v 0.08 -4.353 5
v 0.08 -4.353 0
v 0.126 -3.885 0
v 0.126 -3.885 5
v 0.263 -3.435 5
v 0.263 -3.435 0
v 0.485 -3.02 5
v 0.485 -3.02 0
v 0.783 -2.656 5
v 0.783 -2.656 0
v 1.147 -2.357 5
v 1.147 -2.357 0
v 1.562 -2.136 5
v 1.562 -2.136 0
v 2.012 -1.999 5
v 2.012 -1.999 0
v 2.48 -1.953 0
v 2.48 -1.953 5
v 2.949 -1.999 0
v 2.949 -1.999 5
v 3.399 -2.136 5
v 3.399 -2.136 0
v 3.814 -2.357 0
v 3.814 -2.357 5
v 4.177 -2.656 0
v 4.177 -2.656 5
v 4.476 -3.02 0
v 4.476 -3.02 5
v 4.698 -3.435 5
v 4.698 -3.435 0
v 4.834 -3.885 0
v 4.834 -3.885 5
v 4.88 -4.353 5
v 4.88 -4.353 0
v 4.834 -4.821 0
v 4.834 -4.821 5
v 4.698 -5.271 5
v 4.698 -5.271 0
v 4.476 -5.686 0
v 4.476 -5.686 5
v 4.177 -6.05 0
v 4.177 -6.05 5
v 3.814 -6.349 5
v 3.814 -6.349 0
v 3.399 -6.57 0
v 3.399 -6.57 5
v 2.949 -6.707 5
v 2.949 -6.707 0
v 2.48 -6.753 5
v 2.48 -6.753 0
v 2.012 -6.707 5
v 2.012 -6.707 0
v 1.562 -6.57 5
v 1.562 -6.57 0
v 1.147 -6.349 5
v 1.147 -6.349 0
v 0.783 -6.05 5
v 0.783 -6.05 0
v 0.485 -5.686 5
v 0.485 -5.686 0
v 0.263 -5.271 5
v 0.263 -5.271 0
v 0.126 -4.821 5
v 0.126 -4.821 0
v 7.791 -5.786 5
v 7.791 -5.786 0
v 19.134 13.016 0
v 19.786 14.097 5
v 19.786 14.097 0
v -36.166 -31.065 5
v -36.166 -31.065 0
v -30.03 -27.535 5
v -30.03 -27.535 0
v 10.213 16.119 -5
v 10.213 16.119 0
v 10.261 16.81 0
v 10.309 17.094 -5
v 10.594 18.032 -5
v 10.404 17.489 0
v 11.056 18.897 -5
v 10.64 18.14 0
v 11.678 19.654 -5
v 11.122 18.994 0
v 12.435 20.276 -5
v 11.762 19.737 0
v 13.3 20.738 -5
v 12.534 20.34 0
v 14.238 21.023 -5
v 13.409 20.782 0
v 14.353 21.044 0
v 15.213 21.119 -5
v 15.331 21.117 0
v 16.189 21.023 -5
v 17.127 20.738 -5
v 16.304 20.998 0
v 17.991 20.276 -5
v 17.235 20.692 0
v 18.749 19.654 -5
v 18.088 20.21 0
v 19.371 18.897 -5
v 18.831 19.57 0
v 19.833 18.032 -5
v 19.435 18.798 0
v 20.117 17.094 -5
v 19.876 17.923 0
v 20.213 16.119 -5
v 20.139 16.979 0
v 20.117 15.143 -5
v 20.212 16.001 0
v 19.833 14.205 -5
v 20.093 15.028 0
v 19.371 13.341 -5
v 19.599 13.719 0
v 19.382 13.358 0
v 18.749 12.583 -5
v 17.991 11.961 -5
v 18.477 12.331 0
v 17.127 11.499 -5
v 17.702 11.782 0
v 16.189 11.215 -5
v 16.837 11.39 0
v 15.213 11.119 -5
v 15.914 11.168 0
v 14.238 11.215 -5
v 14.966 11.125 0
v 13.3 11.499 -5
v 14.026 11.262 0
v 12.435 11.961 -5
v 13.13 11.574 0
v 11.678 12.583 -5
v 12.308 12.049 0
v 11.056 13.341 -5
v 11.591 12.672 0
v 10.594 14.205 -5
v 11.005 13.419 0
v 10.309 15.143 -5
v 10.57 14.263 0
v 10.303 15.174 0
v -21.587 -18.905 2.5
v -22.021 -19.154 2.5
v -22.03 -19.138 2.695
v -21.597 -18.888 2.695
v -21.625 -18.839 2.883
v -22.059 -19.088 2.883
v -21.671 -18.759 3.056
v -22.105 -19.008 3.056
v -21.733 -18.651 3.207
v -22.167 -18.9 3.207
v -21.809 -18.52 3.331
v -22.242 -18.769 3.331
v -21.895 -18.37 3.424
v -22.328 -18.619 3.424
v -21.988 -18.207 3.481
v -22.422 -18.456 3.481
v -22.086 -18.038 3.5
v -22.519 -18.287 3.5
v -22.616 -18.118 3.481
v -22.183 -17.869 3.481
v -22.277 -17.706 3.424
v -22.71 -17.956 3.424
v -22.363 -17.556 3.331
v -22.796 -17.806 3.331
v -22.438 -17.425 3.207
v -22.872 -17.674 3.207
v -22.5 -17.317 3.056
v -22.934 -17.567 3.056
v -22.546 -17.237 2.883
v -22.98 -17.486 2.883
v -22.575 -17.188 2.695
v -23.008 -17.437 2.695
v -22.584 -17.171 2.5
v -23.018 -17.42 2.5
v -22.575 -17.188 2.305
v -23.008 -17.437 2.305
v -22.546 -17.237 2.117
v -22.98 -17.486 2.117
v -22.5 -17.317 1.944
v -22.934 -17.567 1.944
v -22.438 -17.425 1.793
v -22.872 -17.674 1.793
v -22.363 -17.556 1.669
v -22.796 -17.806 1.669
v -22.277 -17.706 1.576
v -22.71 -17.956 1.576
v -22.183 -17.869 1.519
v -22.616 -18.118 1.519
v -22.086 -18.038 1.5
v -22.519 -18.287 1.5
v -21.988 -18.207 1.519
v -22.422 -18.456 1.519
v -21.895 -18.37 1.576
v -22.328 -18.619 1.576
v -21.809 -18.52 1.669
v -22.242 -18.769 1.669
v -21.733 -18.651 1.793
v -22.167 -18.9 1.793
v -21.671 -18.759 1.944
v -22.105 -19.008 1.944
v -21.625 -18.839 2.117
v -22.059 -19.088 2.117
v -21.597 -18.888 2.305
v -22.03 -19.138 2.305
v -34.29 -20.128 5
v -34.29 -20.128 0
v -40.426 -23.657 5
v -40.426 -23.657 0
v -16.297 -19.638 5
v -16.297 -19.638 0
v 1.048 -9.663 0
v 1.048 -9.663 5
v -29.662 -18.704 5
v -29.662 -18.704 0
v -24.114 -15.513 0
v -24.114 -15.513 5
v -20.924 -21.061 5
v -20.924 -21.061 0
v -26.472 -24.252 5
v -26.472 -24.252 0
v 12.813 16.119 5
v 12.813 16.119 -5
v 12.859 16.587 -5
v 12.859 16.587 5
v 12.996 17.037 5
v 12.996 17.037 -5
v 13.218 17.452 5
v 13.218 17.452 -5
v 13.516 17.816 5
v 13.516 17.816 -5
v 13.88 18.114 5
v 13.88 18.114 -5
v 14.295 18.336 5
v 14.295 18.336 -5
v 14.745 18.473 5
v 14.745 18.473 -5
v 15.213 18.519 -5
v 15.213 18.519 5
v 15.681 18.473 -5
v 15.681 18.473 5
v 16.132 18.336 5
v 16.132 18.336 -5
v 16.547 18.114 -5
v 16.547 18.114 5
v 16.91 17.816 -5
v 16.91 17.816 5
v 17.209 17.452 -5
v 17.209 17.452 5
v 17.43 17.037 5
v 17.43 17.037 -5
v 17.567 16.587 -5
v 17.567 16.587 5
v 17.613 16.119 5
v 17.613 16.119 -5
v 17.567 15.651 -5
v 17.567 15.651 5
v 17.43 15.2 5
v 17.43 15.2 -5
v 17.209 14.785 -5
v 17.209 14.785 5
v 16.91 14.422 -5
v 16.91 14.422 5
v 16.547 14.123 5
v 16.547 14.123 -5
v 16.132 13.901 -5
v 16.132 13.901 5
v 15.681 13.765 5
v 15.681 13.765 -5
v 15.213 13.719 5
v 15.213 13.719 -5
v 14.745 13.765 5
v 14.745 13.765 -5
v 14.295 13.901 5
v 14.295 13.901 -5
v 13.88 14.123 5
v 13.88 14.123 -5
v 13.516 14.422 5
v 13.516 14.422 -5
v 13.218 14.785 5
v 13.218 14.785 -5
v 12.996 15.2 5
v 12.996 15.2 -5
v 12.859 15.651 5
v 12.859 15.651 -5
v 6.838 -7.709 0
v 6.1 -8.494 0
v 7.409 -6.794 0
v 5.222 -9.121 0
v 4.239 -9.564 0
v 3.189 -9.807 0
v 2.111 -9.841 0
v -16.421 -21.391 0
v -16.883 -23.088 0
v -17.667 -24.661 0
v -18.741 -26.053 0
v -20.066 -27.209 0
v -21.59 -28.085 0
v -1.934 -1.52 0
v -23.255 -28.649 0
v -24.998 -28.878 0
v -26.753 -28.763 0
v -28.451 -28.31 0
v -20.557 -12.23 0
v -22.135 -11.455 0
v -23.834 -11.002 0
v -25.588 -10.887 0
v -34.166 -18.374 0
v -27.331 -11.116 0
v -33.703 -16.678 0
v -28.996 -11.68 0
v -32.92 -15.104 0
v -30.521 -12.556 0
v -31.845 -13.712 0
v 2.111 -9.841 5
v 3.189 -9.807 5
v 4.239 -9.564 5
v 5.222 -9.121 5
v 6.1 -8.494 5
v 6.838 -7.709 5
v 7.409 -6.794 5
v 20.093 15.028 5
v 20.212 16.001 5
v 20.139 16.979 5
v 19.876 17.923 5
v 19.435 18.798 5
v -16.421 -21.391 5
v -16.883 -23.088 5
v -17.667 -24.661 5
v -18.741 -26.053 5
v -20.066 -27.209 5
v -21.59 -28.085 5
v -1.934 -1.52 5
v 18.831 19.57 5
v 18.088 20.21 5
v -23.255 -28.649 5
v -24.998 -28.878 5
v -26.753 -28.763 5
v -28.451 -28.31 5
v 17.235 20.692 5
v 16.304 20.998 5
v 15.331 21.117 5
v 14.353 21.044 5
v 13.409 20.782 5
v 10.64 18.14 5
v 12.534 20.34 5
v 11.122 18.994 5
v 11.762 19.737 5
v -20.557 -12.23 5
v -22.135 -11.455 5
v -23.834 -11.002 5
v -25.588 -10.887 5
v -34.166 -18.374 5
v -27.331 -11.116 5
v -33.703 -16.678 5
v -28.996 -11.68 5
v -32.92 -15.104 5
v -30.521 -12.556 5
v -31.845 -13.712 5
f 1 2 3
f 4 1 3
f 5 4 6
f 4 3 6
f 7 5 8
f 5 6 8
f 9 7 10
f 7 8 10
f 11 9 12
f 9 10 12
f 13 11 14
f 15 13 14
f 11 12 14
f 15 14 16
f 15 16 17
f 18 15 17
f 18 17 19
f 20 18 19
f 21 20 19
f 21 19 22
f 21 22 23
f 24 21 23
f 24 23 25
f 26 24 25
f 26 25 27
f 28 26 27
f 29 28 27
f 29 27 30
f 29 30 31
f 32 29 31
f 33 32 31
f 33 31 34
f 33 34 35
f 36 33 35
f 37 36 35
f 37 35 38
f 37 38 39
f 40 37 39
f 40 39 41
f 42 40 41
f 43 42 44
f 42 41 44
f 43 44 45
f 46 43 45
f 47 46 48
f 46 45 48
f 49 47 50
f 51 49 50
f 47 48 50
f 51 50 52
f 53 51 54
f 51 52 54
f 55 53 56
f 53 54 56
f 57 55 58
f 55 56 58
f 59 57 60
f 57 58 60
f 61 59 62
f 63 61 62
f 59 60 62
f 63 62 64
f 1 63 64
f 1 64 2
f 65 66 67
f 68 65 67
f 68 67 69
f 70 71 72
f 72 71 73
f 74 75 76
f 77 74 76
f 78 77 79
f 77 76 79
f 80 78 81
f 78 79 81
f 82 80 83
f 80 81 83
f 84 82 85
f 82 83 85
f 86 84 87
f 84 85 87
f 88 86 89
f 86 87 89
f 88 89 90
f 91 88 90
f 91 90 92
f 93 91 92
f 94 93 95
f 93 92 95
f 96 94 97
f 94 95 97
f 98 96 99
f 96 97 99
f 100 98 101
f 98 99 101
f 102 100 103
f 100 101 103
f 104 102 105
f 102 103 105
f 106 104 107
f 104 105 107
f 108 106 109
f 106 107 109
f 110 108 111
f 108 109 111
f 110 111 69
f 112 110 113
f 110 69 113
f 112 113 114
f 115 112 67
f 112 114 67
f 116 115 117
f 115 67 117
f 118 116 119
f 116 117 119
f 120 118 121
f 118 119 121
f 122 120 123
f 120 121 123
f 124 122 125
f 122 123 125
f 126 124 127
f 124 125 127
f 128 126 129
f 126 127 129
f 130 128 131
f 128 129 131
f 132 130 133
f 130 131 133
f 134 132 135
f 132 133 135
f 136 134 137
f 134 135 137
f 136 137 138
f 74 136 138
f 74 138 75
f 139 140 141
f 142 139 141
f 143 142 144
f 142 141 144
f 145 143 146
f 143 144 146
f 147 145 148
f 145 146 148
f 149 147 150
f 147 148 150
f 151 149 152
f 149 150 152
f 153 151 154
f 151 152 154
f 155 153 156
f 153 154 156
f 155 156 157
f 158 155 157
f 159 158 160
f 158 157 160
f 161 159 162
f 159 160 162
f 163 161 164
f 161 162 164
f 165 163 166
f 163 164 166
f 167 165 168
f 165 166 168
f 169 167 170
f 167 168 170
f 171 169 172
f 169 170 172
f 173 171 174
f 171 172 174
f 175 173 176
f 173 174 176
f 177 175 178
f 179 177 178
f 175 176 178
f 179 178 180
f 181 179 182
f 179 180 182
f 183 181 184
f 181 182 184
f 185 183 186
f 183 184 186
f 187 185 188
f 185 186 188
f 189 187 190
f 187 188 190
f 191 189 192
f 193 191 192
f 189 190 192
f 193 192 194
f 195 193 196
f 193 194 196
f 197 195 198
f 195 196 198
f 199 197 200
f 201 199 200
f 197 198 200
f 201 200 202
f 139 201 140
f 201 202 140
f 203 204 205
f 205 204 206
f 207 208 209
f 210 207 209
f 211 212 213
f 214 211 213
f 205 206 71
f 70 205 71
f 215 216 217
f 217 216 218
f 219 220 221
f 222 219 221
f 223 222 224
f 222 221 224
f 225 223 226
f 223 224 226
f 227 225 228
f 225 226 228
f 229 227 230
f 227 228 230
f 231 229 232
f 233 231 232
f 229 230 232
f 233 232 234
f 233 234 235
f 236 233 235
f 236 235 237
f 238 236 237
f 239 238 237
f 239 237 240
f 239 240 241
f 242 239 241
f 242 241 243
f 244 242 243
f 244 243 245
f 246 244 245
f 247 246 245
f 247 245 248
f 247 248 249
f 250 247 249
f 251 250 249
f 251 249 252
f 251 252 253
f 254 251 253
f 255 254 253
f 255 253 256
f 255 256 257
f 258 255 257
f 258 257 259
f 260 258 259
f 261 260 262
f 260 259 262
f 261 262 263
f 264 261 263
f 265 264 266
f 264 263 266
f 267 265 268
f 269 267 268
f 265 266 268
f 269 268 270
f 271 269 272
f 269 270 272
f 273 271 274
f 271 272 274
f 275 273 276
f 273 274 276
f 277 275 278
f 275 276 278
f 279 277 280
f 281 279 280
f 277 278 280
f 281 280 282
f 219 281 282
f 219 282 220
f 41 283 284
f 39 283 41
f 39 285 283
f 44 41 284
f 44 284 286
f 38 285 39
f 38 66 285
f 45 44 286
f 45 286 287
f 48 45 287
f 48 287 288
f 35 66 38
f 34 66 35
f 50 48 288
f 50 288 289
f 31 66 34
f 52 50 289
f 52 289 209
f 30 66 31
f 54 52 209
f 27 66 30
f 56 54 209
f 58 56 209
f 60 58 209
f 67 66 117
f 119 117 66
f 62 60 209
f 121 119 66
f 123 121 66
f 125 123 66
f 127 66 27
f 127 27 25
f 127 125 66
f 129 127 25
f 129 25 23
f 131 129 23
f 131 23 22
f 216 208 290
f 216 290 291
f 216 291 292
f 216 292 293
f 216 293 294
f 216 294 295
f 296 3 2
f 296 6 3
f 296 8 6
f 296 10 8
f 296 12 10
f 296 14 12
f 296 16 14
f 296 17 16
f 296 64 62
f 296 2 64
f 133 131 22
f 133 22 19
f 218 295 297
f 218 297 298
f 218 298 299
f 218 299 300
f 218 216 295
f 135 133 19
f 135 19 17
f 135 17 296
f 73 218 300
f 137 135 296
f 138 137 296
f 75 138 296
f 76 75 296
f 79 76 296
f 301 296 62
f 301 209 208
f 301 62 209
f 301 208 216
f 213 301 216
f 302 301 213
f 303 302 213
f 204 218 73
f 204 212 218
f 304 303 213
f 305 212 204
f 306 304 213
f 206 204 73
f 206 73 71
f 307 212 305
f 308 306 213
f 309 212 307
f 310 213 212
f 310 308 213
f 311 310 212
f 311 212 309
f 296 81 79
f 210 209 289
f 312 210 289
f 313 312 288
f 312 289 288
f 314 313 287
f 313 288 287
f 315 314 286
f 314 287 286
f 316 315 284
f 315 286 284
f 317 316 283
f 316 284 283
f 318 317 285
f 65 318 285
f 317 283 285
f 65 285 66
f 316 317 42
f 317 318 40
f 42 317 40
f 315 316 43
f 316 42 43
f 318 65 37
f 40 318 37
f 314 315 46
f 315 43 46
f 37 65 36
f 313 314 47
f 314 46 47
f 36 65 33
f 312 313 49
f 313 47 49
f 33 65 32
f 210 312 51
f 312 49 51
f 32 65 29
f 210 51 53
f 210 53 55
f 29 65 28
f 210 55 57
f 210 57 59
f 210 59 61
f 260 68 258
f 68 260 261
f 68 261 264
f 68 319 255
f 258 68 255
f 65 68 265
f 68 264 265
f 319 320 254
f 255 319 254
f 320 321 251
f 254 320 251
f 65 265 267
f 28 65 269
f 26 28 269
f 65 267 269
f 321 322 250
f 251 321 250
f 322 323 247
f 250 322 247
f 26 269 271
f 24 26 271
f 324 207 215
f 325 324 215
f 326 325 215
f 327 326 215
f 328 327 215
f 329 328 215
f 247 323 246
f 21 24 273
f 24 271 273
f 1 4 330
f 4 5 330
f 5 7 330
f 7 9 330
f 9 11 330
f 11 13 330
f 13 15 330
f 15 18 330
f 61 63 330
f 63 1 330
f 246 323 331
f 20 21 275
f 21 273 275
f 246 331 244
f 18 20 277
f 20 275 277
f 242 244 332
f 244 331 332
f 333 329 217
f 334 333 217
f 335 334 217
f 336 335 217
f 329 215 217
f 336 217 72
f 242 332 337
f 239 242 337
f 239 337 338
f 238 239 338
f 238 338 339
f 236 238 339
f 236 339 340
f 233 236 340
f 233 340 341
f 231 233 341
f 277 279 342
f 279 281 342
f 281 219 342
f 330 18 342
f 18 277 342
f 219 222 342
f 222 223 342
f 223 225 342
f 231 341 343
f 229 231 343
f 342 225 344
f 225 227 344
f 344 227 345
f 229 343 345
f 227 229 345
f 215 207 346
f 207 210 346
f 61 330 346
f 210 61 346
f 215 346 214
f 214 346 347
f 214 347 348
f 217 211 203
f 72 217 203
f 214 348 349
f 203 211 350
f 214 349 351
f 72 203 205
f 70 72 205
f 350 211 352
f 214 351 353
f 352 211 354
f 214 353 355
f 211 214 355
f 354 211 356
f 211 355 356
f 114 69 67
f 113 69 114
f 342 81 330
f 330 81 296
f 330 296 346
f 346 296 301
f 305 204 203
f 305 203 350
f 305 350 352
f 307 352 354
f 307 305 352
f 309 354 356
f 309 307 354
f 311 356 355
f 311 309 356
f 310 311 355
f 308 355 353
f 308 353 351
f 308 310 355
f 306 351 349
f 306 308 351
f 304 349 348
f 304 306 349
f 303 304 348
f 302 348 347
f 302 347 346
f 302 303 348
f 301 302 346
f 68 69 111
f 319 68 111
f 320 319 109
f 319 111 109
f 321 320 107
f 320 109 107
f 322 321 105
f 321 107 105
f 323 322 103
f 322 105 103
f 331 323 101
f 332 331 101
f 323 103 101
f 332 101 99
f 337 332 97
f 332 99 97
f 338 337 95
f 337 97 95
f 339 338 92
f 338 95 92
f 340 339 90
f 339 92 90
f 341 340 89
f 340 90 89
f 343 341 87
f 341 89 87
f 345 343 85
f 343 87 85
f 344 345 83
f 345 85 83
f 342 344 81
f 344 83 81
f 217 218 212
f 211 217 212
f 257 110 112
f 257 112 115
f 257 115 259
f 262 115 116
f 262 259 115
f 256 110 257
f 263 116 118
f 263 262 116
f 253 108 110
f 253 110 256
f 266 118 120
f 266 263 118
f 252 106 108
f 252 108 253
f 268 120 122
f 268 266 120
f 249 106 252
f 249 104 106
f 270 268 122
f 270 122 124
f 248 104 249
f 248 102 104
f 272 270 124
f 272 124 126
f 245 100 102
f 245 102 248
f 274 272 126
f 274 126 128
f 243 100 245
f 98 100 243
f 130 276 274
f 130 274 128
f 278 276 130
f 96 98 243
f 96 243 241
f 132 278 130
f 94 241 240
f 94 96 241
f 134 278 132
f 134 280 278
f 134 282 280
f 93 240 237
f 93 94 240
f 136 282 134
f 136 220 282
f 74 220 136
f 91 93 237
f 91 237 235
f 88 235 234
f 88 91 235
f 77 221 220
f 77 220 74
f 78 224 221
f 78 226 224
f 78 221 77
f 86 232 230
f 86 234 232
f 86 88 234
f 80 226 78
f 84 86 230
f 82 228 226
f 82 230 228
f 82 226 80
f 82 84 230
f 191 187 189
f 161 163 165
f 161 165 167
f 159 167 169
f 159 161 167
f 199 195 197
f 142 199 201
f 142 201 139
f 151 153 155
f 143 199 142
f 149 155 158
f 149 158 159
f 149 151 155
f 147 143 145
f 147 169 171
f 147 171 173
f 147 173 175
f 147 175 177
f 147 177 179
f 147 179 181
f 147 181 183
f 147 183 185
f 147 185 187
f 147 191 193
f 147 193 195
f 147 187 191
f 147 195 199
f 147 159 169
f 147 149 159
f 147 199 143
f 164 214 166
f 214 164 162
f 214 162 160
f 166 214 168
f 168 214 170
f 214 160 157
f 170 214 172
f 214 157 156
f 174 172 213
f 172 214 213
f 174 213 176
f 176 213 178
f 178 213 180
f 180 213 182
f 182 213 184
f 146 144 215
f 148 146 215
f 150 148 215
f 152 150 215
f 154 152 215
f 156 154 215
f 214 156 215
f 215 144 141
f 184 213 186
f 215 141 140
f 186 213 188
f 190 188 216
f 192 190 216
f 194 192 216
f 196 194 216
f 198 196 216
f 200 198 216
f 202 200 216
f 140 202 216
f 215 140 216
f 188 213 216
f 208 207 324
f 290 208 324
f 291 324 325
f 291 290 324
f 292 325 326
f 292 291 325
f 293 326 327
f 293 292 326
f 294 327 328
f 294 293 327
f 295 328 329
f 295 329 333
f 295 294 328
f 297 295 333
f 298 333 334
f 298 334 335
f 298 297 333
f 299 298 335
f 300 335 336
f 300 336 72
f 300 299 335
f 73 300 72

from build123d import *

# Parameters (mm, degrees)
BOSS_EXTRUDE1_DEPTH = 5
SKETCH8_R           = 9
BOSS_EXTRUDE3_DEPTH = 5
CUT_EXTRUDE1_REACH  = 53.228
SKETCH12_R          = 1
CUT_EXTRUDE2_DEPTH  = 0.5
SKETCH13_R          = 5
BOSS_EXTRUDE5_DEPTH = 5
CUT_EXTRUDE3_REACH  = 53.955
SKETCH15_R          = 2.4
CUT_EXTRUDE4_REACH  = 53.228
SKETCH16_R          = 2.4


with BuildPart() as part:
    # Sketch1 → Boss-Extrude1 (new body)
    with BuildSketch(Plane(origin=(0, 0, 0), x_dir=(0.4985289035363021, -0.866873077410351, 0), z_dir=(0, 0, 1))):
        with BuildLine():
            ThreePointArc((8.899126574, -3.909046337), (10.510039278, -0.019959041), (8.899126574, 3.869128256))
            Line((8.899126574, 3.869128256), (-2.35642803, 24.179978159))
            ThreePointArc((-2.35642803, 24.179978159), (-9.345167797, 25.255857552), (-10.421047189, 18.267117784))
            Line((-10.421047189, 18.267117784), (0.353553391, -2.434608777))
            Line((0.353553391, -2.434608777), (0.353553391, -46.838046337))
            Line((0.353553391, -46.838046337), (8.899126574, -46.838046337))
            Line((8.899126574, -46.838046337), (8.899126574, -3.909046337))
        make_face()
    extrude(amount=BOSS_EXTRUDE1_DEPTH)

    # Sketch8 → Boss-Extrude3 (add)
    with BuildSketch(Plane(origin=(0, 0, 0), x_dir=(-1, 0, 0), z_dir=(0, 0, -1))):
        with Locations((25.293181008, -19.882635909)):
            Circle(SKETCH8_R)
    extrude(amount=-BOSS_EXTRUDE3_DEPTH)

    # Sketch11 → Cut-Extrude1 (cut, up to next)
    with BuildSketch(Plane(origin=(0, 0, 0), x_dir=(-1, 0, 0), z_dir=(0, 0, -1)), mode=Mode.PRIVATE) as cut_extrude1_sk1:
        Polygon((26.471882365, -24.251922248), (29.662467347, -18.703934553), (24.114479652, -15.51334957), (20.923894669, -21.061337265), align=None)
    cut_extrude1_tool1 = extrude(cut_extrude1_sk1.sketch, amount=-CUT_EXTRUDE1_REACH, mode=Mode.PRIVATE) & part.part
    add(cut_extrude1_tool1.solids().sort_by_distance((-25.293181, -19.882636, 0))[0], mode=Mode.SUBTRACT)

    # Sketch12 → Cut-Extrude2 (cut)
    with BuildSketch(Plane(origin=(-24.825551359, -14.27689384, 0), x_dir=(0, 0, 1), z_dir=(-0.866873077410351, -0.49852890353630236, 0))):
        with Locations(Location((2.5, -4.626339983, 0), (0, 0, 270))):
            Circle(SKETCH12_R)
    extrude(amount=-CUT_EXTRUDE2_DEPTH, mode=Mode.SUBTRACT)

    # Sketch13 → Boss-Extrude5 (add)
    with BuildSketch(Plane(origin=(0, 0, 0), x_dir=(-1, 0, 0), z_dir=(0, 0, -1))):
        with Locations((-15.213151988, 16.118776732)):
            Circle(SKETCH13_R)
    extrude(amount=BOSS_EXTRUDE5_DEPTH)

    # Sketch15 → Cut-Extrude3 (cut, up to next)
    with BuildSketch(Plane(origin=(0, 0, -5), x_dir=(-1, 0, 0), z_dir=(0, 0, -1)), mode=Mode.PRIVATE) as cut_extrude3_sk1:
        with Locations((-15.213151988, 16.118776732)):
            Circle(SKETCH15_R)
    cut_extrude3_tool1 = extrude(cut_extrude3_sk1.sketch, amount=-CUT_EXTRUDE3_REACH, mode=Mode.PRIVATE) & part.part
    add(cut_extrude3_tool1.solids().sort_by_distance((15.213152, 16.118777, -5))[0], mode=Mode.SUBTRACT)

    # Sketch16 → Cut-Extrude4 (cut, up to next)
    with BuildSketch(Plane(origin=(0, 0, 0), x_dir=(-1, 0, 0), z_dir=(0, 0, -1)), mode=Mode.PRIVATE) as cut_extrude4_sk1:
        with Locations((-2.480347433, -4.353018325)):
            Circle(SKETCH16_R)
    cut_extrude4_tool1 = extrude(cut_extrude4_sk1.sketch, amount=-CUT_EXTRUDE4_REACH, mode=Mode.PRIVATE) & part.part
    add(cut_extrude4_tool1.solids().sort_by_distance((2.480347, -4.353018, 0))[0], mode=Mode.SUBTRACT)


solid = part.part
